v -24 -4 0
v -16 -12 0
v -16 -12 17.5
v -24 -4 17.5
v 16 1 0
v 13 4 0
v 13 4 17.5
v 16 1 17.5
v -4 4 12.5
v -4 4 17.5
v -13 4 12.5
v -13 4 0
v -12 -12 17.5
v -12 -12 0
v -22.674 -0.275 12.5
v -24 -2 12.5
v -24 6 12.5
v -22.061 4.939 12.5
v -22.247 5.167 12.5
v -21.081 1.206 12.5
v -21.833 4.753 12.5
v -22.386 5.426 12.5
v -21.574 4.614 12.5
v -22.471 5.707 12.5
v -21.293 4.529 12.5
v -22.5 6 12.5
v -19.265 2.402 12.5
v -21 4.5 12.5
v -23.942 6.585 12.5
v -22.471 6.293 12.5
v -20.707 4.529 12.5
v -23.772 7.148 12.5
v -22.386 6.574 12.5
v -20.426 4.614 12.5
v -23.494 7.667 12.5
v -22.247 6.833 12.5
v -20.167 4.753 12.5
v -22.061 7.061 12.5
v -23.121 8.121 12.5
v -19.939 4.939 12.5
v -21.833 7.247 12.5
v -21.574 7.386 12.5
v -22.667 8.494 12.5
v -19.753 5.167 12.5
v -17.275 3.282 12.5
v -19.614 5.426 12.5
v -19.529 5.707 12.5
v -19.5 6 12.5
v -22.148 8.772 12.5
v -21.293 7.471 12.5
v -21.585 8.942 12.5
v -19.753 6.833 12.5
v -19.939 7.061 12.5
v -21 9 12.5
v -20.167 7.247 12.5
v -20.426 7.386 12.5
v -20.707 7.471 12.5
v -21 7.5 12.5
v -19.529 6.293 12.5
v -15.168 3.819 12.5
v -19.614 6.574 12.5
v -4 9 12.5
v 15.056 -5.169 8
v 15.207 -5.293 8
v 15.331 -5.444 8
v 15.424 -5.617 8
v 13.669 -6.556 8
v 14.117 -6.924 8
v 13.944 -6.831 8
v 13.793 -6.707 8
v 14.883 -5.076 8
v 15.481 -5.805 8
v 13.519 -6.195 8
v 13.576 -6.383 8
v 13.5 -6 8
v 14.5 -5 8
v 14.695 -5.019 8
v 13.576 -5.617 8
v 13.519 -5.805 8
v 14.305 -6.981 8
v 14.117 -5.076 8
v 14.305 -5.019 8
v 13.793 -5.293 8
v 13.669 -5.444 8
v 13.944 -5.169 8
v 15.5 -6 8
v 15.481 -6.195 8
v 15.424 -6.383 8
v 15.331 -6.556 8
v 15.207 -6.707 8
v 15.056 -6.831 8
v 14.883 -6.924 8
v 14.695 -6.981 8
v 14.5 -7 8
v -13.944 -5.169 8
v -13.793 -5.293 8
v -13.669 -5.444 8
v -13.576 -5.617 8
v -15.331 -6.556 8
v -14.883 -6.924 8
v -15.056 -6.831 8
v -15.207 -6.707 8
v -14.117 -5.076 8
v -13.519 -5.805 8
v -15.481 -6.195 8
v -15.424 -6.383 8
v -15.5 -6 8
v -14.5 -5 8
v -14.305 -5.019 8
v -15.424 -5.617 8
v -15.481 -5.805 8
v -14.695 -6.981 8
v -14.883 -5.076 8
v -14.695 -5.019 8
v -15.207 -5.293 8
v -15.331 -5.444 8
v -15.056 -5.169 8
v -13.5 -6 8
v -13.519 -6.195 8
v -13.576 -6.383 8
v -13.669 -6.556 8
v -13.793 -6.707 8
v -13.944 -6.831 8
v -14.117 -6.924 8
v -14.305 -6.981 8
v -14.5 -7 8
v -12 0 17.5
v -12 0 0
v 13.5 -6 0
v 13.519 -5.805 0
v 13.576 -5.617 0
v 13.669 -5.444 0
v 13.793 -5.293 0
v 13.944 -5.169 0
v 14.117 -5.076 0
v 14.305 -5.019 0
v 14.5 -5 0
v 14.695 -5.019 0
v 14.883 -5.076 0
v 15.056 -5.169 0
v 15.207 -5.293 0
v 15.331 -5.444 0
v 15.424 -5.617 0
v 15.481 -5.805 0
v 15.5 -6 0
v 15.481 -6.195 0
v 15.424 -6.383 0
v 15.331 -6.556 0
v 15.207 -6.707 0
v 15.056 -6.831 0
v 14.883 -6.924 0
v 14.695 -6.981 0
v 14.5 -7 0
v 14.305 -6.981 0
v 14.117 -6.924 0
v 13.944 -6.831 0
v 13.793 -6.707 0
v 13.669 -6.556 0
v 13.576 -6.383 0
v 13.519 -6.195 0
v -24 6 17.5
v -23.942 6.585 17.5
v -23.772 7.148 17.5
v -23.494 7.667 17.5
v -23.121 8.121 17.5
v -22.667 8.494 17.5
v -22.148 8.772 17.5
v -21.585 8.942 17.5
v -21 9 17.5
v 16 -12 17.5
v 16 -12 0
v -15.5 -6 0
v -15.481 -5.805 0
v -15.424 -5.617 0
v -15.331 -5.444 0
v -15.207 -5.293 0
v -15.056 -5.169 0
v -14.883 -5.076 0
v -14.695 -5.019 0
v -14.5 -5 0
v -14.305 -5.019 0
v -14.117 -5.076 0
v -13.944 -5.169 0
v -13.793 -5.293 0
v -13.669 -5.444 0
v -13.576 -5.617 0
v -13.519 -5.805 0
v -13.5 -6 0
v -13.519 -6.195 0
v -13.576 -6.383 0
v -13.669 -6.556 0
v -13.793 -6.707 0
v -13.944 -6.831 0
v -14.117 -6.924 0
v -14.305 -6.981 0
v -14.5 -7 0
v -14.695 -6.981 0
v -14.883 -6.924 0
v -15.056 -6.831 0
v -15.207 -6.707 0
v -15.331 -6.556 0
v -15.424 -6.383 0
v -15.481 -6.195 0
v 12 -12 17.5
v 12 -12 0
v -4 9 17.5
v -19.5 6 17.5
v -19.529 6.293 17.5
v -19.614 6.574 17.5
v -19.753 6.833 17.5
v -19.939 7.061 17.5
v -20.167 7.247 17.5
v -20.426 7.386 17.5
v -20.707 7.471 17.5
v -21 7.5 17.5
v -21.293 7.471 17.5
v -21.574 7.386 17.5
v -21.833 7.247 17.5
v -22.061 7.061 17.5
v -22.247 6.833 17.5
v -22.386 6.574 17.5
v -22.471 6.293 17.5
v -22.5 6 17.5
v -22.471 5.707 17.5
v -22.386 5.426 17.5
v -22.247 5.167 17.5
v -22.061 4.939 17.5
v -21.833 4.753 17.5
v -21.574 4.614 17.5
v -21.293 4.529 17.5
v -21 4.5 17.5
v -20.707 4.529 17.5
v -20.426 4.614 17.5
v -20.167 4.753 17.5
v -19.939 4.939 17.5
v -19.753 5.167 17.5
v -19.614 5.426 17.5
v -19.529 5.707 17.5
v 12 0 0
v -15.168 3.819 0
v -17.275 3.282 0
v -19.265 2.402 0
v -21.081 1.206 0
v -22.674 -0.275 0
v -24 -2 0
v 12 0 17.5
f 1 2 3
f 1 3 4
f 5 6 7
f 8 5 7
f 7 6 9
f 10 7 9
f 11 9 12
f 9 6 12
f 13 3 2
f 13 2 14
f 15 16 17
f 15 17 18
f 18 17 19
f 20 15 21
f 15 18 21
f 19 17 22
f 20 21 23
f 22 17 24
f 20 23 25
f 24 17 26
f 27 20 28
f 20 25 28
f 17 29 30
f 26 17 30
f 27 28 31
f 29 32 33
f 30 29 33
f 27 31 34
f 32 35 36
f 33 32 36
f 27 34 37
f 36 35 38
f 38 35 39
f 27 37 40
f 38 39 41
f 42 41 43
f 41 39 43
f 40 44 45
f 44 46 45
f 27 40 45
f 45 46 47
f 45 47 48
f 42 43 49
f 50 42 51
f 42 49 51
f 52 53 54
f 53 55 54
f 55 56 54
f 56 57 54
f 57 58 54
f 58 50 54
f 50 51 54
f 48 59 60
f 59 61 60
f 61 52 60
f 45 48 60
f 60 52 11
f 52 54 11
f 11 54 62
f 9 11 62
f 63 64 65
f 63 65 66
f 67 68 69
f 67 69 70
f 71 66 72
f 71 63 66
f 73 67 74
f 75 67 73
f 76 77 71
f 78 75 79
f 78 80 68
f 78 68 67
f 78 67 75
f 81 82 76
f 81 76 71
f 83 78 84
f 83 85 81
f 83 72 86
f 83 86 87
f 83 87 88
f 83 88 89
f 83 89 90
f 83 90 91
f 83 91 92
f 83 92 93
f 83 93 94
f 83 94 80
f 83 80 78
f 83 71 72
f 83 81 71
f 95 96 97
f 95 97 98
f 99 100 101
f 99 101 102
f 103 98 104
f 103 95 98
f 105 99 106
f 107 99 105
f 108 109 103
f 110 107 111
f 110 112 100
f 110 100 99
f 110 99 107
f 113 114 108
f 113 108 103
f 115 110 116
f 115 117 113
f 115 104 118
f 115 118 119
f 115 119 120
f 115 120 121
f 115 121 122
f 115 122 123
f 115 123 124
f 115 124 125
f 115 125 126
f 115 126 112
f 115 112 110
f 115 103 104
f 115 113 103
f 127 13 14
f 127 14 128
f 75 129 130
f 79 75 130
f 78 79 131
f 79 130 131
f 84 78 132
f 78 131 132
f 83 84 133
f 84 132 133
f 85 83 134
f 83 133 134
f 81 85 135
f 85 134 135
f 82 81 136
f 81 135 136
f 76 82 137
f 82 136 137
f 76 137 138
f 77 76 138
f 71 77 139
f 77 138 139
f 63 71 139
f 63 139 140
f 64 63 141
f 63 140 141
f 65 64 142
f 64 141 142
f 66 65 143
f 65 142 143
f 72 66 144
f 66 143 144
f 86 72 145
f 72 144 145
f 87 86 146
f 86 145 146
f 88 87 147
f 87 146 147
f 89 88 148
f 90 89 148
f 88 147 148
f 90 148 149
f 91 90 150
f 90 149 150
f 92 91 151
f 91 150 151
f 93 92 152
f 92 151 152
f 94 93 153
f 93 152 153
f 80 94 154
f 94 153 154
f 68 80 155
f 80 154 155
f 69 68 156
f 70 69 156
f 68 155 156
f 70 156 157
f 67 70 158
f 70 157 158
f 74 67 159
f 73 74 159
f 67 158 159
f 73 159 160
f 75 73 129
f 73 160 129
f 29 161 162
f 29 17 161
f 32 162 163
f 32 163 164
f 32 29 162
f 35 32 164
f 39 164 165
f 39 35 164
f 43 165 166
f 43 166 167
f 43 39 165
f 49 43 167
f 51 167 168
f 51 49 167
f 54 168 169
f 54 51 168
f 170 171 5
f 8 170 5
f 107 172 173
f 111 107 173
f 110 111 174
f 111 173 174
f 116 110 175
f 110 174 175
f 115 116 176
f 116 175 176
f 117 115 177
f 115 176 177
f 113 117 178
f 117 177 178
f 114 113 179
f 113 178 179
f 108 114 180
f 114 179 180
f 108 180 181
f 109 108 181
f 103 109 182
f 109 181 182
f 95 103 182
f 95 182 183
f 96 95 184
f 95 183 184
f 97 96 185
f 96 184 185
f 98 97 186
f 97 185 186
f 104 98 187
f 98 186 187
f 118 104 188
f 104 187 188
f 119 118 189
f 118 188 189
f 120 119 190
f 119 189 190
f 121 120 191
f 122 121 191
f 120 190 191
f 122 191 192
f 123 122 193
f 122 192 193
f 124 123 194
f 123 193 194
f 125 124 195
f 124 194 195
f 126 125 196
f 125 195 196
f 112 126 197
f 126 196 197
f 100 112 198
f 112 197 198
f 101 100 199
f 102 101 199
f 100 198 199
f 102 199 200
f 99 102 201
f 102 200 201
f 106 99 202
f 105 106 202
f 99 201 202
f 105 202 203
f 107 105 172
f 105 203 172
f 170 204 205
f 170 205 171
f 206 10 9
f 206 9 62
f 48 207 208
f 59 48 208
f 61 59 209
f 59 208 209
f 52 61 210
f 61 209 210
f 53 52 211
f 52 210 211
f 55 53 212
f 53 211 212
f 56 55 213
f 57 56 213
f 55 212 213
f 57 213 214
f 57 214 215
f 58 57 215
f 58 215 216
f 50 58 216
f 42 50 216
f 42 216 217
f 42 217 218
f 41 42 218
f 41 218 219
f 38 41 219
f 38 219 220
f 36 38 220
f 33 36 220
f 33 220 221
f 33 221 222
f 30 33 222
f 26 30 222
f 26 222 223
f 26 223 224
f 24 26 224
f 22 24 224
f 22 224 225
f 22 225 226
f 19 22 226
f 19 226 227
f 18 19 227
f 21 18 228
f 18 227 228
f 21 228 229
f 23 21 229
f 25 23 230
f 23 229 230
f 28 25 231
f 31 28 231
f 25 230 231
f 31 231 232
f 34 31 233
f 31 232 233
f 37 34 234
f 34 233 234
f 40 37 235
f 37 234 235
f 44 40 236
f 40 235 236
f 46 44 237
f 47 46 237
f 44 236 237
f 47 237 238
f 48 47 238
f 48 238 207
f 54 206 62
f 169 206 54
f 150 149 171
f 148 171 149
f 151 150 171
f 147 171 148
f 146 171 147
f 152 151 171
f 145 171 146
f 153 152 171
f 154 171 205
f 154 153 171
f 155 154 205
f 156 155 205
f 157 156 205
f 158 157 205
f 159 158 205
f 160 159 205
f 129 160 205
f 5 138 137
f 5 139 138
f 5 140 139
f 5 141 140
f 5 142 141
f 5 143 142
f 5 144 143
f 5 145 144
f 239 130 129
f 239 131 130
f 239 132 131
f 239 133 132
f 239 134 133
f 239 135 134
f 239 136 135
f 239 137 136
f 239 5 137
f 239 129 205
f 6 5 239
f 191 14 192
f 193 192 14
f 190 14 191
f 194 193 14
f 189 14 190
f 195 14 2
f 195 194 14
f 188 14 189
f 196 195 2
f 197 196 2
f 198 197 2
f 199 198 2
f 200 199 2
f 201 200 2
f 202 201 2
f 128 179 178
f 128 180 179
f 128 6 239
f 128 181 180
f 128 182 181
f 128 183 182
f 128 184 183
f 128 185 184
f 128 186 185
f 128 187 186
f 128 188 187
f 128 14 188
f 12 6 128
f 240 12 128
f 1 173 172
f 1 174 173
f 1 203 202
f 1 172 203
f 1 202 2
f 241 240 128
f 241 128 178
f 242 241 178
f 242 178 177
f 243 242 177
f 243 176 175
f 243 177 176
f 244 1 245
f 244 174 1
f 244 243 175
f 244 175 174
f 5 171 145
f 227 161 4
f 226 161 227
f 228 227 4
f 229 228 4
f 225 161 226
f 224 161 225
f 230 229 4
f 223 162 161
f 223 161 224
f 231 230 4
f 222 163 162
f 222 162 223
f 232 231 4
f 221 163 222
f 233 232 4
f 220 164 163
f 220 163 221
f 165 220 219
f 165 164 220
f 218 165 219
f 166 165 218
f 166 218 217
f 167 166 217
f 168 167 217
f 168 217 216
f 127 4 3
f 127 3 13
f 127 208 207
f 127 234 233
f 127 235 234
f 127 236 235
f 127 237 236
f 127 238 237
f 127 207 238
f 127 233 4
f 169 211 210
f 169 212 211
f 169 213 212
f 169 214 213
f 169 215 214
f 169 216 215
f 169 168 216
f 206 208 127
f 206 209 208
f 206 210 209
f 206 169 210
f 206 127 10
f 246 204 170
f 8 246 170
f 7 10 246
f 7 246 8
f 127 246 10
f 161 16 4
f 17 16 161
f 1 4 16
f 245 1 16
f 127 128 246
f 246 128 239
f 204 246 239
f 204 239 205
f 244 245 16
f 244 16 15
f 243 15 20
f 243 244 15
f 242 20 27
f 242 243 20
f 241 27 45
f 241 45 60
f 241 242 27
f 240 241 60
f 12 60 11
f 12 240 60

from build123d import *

# Parameters (mm, degrees)
BOSS_EXTRUDE1_DEPTH = 17.5
CHAMFER1_SIZE       = 3
BOSS_EXTRUDE2_DEPTH = 5
CHAMFER2_SIZE       = 8
SKETCH3_R           = 1.5
CUT_EXTRUDE1_DEPTH  = 33.035136959
FILLET1_R           = 3
SKETCH4_R           = 1
CUT_EXTRUDE2_DEPTH  = 8
BOSS_EXTRUDE3_DEPTH = 12.5


with BuildPart() as part:
    # Sketch1 → Boss-Extrude1 (new body)
    with BuildSketch(Plane.XY):
        Polygon((12, -12), (16, -12), (16, 4), (-16, 4), (-16, -12), (-12, -12), (-12, 0), (12, 0), align=None)
    extrude(amount=BOSS_EXTRUDE1_DEPTH)

    # Chamfer1
    chamfer1_edges = [part.edges().sort_by_distance(p)[0] for p in [
        (-16, 4, 8.75),
        (16, 4, 8.75),
    ]]
    chamfer(chamfer1_edges, length=CHAMFER1_SIZE)

    # Sketch2 → Boss-Extrude2 (add)
    with BuildSketch(Plane.XY.offset(17.5)):
        Polygon((-16, 1), (-4, 1), (-4, 9), (-16, 9), (-24, 9), (-24, -12), (-16, -12), align=None)
    extrude(amount=-BOSS_EXTRUDE2_DEPTH)

    # Chamfer2
    chamfer2_edges = [part.edges().sort_by_distance(p)[0] for p in [
        (-24, -12, 15),
    ]]
    chamfer(chamfer2_edges, length=CHAMFER2_SIZE)

    # Sketch3 → Cut-Extrude1 (cut, through all)
    with BuildSketch(Plane.XY.offset(17.5)):
        with Locations((-21, 6)):
            Circle(SKETCH3_R)
    extrude(amount=-CUT_EXTRUDE1_DEPTH, mode=Mode.SUBTRACT)

    # Fillet1
    fillet1_edges = [part.edges().sort_by_distance(p)[0] for p in [
        (-24, 9, 15),
    ]]
    fillet(fillet1_edges, radius=FILLET1_R)

    # Sketch4 → Cut-Extrude2 (cut)
    with BuildSketch(Plane(origin=(0, 0, 0), x_dir=(-1, 0, 0), z_dir=(0, 0, -1))):
        with Locations((-14.5, -6)):
            Circle(SKETCH4_R)
        with Locations((14.5, -6)):
            Circle(SKETCH4_R)
    extrude(amount=-CUT_EXTRUDE2_DEPTH, mode=Mode.SUBTRACT)

    # Sketch5 → Boss-Extrude3 (add)
    with BuildSketch(Plane(origin=(0, 0, 0), x_dir=(-1, 0, 0), z_dir=(0, 0, -1))):
        with BuildLine():
            Line((13, 4), (16, 1))
            Line((16, 1), (16, -12))
            Line((16, -12), (24, -4))
            Line((24, -4), (24, -2))
            ThreePointArc((24, -2), (19.264982043, 2.402467079), (13, 4))
        make_face()
    extrude(amount=-BOSS_EXTRUDE3_DEPTH)


solid = part.part
